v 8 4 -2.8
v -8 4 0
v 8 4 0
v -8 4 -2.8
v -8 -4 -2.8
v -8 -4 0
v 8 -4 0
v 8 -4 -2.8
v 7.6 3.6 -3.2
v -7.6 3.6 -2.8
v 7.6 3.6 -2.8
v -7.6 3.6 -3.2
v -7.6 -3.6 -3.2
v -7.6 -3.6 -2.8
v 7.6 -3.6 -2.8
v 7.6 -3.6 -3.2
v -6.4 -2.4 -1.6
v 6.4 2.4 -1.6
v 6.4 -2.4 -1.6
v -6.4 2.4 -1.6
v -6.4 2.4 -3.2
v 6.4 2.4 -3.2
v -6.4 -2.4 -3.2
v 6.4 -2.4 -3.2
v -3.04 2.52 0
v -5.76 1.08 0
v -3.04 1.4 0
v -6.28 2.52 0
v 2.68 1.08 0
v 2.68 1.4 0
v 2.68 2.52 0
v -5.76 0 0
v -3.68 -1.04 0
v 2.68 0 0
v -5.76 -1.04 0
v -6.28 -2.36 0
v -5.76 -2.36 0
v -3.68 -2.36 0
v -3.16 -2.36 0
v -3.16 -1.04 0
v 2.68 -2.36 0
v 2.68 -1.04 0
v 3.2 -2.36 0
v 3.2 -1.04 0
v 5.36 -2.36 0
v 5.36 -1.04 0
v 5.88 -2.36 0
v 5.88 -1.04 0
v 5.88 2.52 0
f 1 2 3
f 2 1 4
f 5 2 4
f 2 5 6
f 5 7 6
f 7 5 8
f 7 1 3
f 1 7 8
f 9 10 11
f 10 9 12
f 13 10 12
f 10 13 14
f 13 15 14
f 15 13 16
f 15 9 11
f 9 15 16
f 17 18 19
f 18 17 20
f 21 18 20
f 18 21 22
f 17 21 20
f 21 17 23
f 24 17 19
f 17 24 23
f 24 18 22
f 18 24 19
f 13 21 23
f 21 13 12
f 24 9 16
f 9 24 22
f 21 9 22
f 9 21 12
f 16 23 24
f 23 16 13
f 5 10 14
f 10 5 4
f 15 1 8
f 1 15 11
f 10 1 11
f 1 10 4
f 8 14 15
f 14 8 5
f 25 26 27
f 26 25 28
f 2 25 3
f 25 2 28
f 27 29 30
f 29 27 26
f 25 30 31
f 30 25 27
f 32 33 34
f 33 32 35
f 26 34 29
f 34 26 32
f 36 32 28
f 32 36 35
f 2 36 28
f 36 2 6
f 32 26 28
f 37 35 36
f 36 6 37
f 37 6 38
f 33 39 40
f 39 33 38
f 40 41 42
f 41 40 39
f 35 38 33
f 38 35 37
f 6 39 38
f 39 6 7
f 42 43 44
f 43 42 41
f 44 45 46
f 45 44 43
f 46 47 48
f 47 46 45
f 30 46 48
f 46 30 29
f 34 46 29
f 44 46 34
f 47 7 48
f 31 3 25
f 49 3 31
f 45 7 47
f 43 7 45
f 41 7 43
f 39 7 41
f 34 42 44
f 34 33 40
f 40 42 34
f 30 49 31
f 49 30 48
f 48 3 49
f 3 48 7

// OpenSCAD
// file: ../p/4-4edge.scad
use <../lib.scad>
$fa=1; $fs=0.2;
function ldraw_lib__4_4edge(realsolid=false) = [
// 0 Circle 1.0
// 0 Name: 4-4edge.dat
// 0 Author: James Jessiman
// 0 !LDRAW_ORG Primitive UPDATE 2017-01
// 0 !LICENSE Licensed under CC BY 2.0 and CC BY 4.0 : see CAreadme.txt
// 
// 0 BFC CERTIFY CCW
  [0,"BFC","CERTIFY"],
  [0,"BFC","CCW"],
// 
// 0 !HISTORY 1998-12-15 [PTadmin] Official Update 1998-10
// 0 !HISTORY 2005-12-28 [PTadmin] Official Update 2005-01
// 0 !HISTORY 2007-06-24 [PTadmin] Header formatted for Contributor Agreement
// 0 !HISTORY 2008-07-01 [PTadmin] Official Update 2008-01
// 0 !HISTORY 2017-01-15 [Steffen] BFCed
// 0 !HISTORY 2017-12-30 [PTadmin] Official Update 2017-01
// 
// 
// 2 24 1 0 0 0.9239 0 0.3827
  [2,24,1,0,0,0.9239,0,0.3827],
// 2 24 0.9239 0 0.3827 0.7071 0 0.7071
  [2,24,0.9239,0,0.3827,0.7071,0,0.7071],
// 2 24 0.7071 0 0.7071 0.3827 0 0.9239
  [2,24,0.7071,0,0.7071,0.3827,0,0.9239],
// 2 24 0.3827 0 0.9239 0 0 1
  [2,24,0.3827,0,0.9239,0,0,1],
// 2 24 0 0 1 -0.3827 0 0.9239
  [2,24,0,0,1,-0.3827,0,0.9239],
// 2 24 -0.3827 0 0.9239 -0.7071 0 0.7071
  [2,24,-0.3827,0,0.9239,-0.7071,0,0.7071],
// 2 24 -0.7071 0 0.7071 -0.9239 0 0.3827
  [2,24,-0.7071,0,0.7071,-0.9239,0,0.3827],
// 2 24 -0.9239 0 0.3827 -1 0 -0
  [2,24,-0.9239,0,0.3827,-1,0,-0],
// 2 24 -1 0 -0 -0.9239 0 -0.3827
  [2,24,-1,0,-0,-0.9239,0,-0.3827],
// 2 24 -0.9239 0 -0.3827 -0.7071 0 -0.7071
  [2,24,-0.9239,0,-0.3827,-0.7071,0,-0.7071],
// 2 24 -0.7071 0 -0.7071 -0.3827 0 -0.9239
  [2,24,-0.7071,0,-0.7071,-0.3827,0,-0.9239],
// 2 24 -0.3827 0 -0.9239 0 0 -1
  [2,24,-0.3827,0,-0.9239,0,0,-1],
// 2 24 0 0 -1 0.3827 0 -0.9239
  [2,24,0,0,-1,0.3827,0,-0.9239],
// 2 24 0.3827 0 -0.9239 0.7071 0 -0.7071
  [2,24,0.3827,0,-0.9239,0.7071,0,-0.7071],
// 2 24 0.7071 0 -0.7071 0.9239 0 -0.3827
  [2,24,0.7071,0,-0.7071,0.9239,0,-0.3827],
// 2 24 0.9239 0 -0.3827 1 0 0
  [2,24,0.9239,0,-0.3827,1,0,0],
];
module ldraw_lib__4_4edge(step=0, col=false, unit=2/5, alt=false, line=0.2, solid=!$preview)
    makepoly(ldraw_lib__4_4edge(solid), step=step, col=col, unit=unit, alt=alt, line=line, solid=solid);
ldraw_lib__4_4edge(line=0.2);
// file: ../p/4-4disc.scad
use <../lib.scad>
$fa=1; $fs=0.2;
function ldraw_lib__4_4disc(realsolid=false) = [
// 0 Disc 1.0
// 0 Name: 4-4disc.dat
// 0 Author: James Jessiman
// 0 !LDRAW_ORG Primitive UPDATE 2002-02
// 0 !LICENSE Licensed under CC BY 2.0 and CC BY 4.0 : see CAreadme.txt
// 
// 0 BFC CERTIFY CCW
  [0,"BFC","CERTIFY"],
  [0,"BFC","CCW"],
// 
// 0 !HISTORY 1998-12-15 [PTadmin] Official Update 1998-10
// 0 !HISTORY 2002-03-23 [sbliss] Added BFC statement
// 0 !HISTORY 2002-04-25 [PTadmin] Official Update 2002-02
// 0 !HISTORY 2007-06-24 [PTadmin] Header formatted for Contributor Agreement
// 0 !HISTORY 2008-07-01 [PTadmin] Official Update 2008-01
// 
// 
// 3 16 0 0 0 1 0 0 0.9239 0 0.3827
  [3,16,0,0,0,1,0,0,0.9239,0,0.3827],
// 3 16 0 0 0 0.9239 0 0.3827 0.7071 0 0.7071
  [3,16,0,0,0,0.9239,0,0.3827,0.7071,0,0.7071],
// 3 16 0 0 0 0.7071 0 0.7071 0.3827 0 0.9239
  [3,16,0,0,0,0.7071,0,0.7071,0.3827,0,0.9239],
// 3 16 0 0 0 0.3827 0 0.9239 0 0 1
  [3,16,0,0,0,0.3827,0,0.9239,0,0,1],
// 3 16 0 0 0 0 0 1 -0.3827 0 0.9239
  [3,16,0,0,0,0,0,1,-0.3827,0,0.9239],
// 3 16 0 0 0 -0.3827 0 0.9239 -0.7071 0 0.7071
  [3,16,0,0,0,-0.3827,0,0.9239,-0.7071,0,0.7071],
// 3 16 0 0 0 -0.7071 0 0.7071 -0.9239 0 0.3827
  [3,16,0,0,0,-0.7071,0,0.7071,-0.9239,0,0.3827],
// 3 16 0 0 0 -0.9239 0 0.3827 -1 0 -0
  [3,16,0,0,0,-0.9239,0,0.3827,-1,0,-0],
// 3 16 0 0 0 -1 0 -0 -0.9239 0 -0.3827
  [3,16,0,0,0,-1,0,-0,-0.9239,0,-0.3827],
// 3 16 0 0 0 -0.9239 0 -0.3827 -0.7071 0 -0.7071
  [3,16,0,0,0,-0.9239,0,-0.3827,-0.7071,0,-0.7071],
// 3 16 0 0 0 -0.7071 0 -0.7071 -0.3827 0 -0.9239
  [3,16,0,0,0,-0.7071,0,-0.7071,-0.3827,0,-0.9239],
// 3 16 0 0 0 -0.3827 0 -0.9239 0 0 -1
  [3,16,0,0,0,-0.3827,0,-0.9239,0,0,-1],
// 3 16 0 0 0 0 0 -1 0.3827 0 -0.9239
  [3,16,0,0,0,0,0,-1,0.3827,0,-0.9239],
// 3 16 0 0 0 0.3827 0 -0.9239 0.7071 0 -0.7071
  [3,16,0,0,0,0.3827,0,-0.9239,0.7071,0,-0.7071],
// 3 16 0 0 0 0.7071 0 -0.7071 0.9239 0 -0.3827
  [3,16,0,0,0,0.7071,0,-0.7071,0.9239,0,-0.3827],
// 3 16 0 0 0 0.9239 0 -0.3827 1 0 0
  [3,16,0,0,0,0.9239,0,-0.3827,1,0,0],
// 0
];
module ldraw_lib__4_4disc(step=0, col=false, unit=2/5, alt=false, line=0.2, solid=!$preview)
    makepoly(ldraw_lib__4_4disc(solid), step=step, col=col, unit=unit, alt=alt, line=line, solid=solid);
ldraw_lib__4_4disc(line=0.2);
// file: ../p/4-4cyli.scad
use <../lib.scad>
$fa=1; $fs=0.2;
function ldraw_lib__4_4cyli(realsolid=false) = [
// 0 Cylinder 1.0
// 0 Name: 4-4cyli.dat
// 0 Author: James Jessiman
// 0 !LDRAW_ORG Primitive UPDATE 2005-01
// 0 !LICENSE Licensed under CC BY 2.0 and CC BY 4.0 : see CAreadme.txt
// 
// 0 BFC CERTIFY CCW
  [0,"BFC","CERTIFY"],
  [0,"BFC","CCW"],
// 
// 0 !HISTORY 1998-12-15 [PTadmin] Official Update 1998-10
// 0 !HISTORY 2002-03-23 [sbliss] Added BFC statement; merged headers from files in distributions LDraw 0.27 and Complete.
// 0 !HISTORY 2002-04-25 [PTadmin] Official Update 2002-02
// 0 !HISTORY 2004-12-14 [guyvivan] BFC CCW
// 0 !HISTORY 2005-12-28 [PTadmin] Official Update 2005-01
// 0 !HISTORY 2007-06-24 [PTadmin] Header formatted for Contributor Agreement
// 0 !HISTORY 2008-07-01 [PTadmin] Official Update 2008-01
// 
// 
// 4 16 1 1 0 0.9239 1 0.3827 0.9239 0 0.3827 1 0 0
  [4,16,1,1,0,0.9239,1,0.3827,0.9239,0,0.3827,1,0,0],
// 5 24 1 0 0 1 1 0 0.9239 0 0.3827 0.9239 0 -0.3827
  [5,24,1,0,0,1,1,0,0.9239,0,0.3827,0.9239,0,-0.3827],
// 4 16 0.9239 1 0.3827 0.7071 1 0.7071 0.7071 0 0.7071 0.9239 0 0.3827
  [4,16,0.9239,1,0.3827,0.7071,1,0.7071,0.7071,0,0.7071,0.9239,0,0.3827],
// 5 24 0.9239 0 0.3827 0.9239 1 0.3827 0.7071 0 0.7071 1 0 0
  [5,24,0.9239,0,0.3827,0.9239,1,0.3827,0.7071,0,0.7071,1,0,0],
// 4 16 0.7071 1 0.7071 0.3827 1 0.9239 0.3827 0 0.9239 0.7071 0 0.7071
  [4,16,0.7071,1,0.7071,0.3827,1,0.9239,0.3827,0,0.9239,0.7071,0,0.7071],
// 5 24 0.7071 0 0.7071 0.7071 1 0.7071 0.3827 0 0.9239 0.9239 0 0.3827
  [5,24,0.7071,0,0.7071,0.7071,1,0.7071,0.3827,0,0.9239,0.9239,0,0.3827],
// 4 16 0.3827 1 0.9239 0 1 1 0 0 1 0.3827 0 0.9239
  [4,16,0.3827,1,0.9239,0,1,1,0,0,1,0.3827,0,0.9239],
// 5 24 0.3827 0 0.9239 0.3827 1 0.9239 0 0 1 0.7071 0 0.7071
  [5,24,0.3827,0,0.9239,0.3827,1,0.9239,0,0,1,0.7071,0,0.7071],
// 4 16 0 1 1 -0.3827 1 0.9239 -0.3827 0 0.9239 0 0 1
  [4,16,0,1,1,-0.3827,1,0.9239,-0.3827,0,0.9239,0,0,1],
// 5 24 0 0 1 0 1 1 -0.3827 0 0.9239 0.3827 0 0.9239
  [5,24,0,0,1,0,1,1,-0.3827,0,0.9239,0.3827,0,0.9239],
// 4 16 -0.3827 1 0.9239 -0.7071 1 0.7071 -0.7071 0 0.7071 -0.3827 0 0.9239
  [4,16,-0.3827,1,0.9239,-0.7071,1,0.7071,-0.7071,0,0.7071,-0.3827,0,0.9239],
// 5 24 -0.3827 0 0.9239 -0.3827 1 0.9239 -0.7071 0 0.7071 0 0 1
  [5,24,-0.3827,0,0.9239,-0.3827,1,0.9239,-0.7071,0,0.7071,0,0,1],
// 4 16 -0.7071 1 0.7071 -0.9239 1 0.3827 -0.9239 0 0.3827 -0.7071 0 0.7071
  [4,16,-0.7071,1,0.7071,-0.9239,1,0.3827,-0.9239,0,0.3827,-0.7071,0,0.7071],
// 5 24 -0.7071 0 0.7071 -0.7071 1 0.7071 -0.9239 0 0.3827 -0.3827 0 0.9239
  [5,24,-0.7071,0,0.7071,-0.7071,1,0.7071,-0.9239,0,0.3827,-0.3827,0,0.9239],
// 4 16 -0.9239 1 0.3827 -1 1 0 -1 0 0 -0.9239 0 0.3827
  [4,16,-0.9239,1,0.3827,-1,1,0,-1,0,0,-0.9239,0,0.3827],
// 5 24 -0.9239 0 0.3827 -0.9239 1 0.3827 -1 0 0 -0.7071 0 0.7071
  [5,24,-0.9239,0,0.3827,-0.9239,1,0.3827,-1,0,0,-0.7071,0,0.7071],
// 4 16 -1 1 0 -0.9239 1 -0.3827 -0.9239 0 -0.3827 -1 0 0
  [4,16,-1,1,0,-0.9239,1,-0.3827,-0.9239,0,-0.3827,-1,0,0],
// 5 24 -1 0 0 -1 1 0 -0.9239 0 -0.3827 -0.9239 0 0.3827
  [5,24,-1,0,0,-1,1,0,-0.9239,0,-0.3827,-0.9239,0,0.3827],
// 4 16 -0.9239 1 -0.3827 -0.7071 1 -0.7071 -0.7071 0 -0.7071 -0.9239 0 -0.3827
  [4,16,-0.9239,1,-0.3827,-0.7071,1,-0.7071,-0.7071,0,-0.7071,-0.9239,0,-0.3827],
// 5 24 -0.9239 0 -0.3827 -0.9239 1 -0.3827 -0.7071 0 -0.7071 -1 0 0
  [5,24,-0.9239,0,-0.3827,-0.9239,1,-0.3827,-0.7071,0,-0.7071,-1,0,0],
// 4 16 -0.7071 1 -0.7071 -0.3827 1 -0.9239 -0.3827 0 -0.9239 -0.7071 0 -0.7071
  [4,16,-0.7071,1,-0.7071,-0.3827,1,-0.9239,-0.3827,0,-0.9239,-0.7071,0,-0.7071],
// 5 24 -0.7071 0 -0.7071 -0.7071 1 -0.7071 -0.3827 0 -0.9239 -0.9239 0 -0.3827
  [5,24,-0.7071,0,-0.7071,-0.7071,1,-0.7071,-0.3827,0,-0.9239,-0.9239,0,-0.3827],
// 4 16 -0.3827 1 -0.9239 0 1 -1 0 0 -1 -0.3827 0 -0.9239
  [4,16,-0.3827,1,-0.9239,0,1,-1,0,0,-1,-0.3827,0,-0.9239],
// 5 24 -0.3827 0 -0.9239 -0.3827 1 -0.9239 0 0 -1 -0.7071 0 -0.7071
  [5,24,-0.3827,0,-0.9239,-0.3827,1,-0.9239,0,0,-1,-0.7071,0,-0.7071],
// 4 16 0 1 -1 0.3827 1 -0.9239 0.3827 0 -0.9239 0 0 -1
  [4,16,0,1,-1,0.3827,1,-0.9239,0.3827,0,-0.9239,0,0,-1],
// 5 24 0 0 -1 0 1 -1 0.3827 0 -0.9239 -0.3827 0 -0.9239
  [5,24,0,0,-1,0,1,-1,0.3827,0,-0.9239,-0.3827,0,-0.9239],
// 4 16 0.3827 1 -0.9239 0.7071 1 -0.7071 0.7071 0 -0.7071 0.3827 0 -0.9239
  [4,16,0.3827,1,-0.9239,0.7071,1,-0.7071,0.7071,0,-0.7071,0.3827,0,-0.9239],
// 5 24 0.3827 0 -0.9239 0.3827 1 -0.9239 0.7071 0 -0.7071 0 0 -1
  [5,24,0.3827,0,-0.9239,0.3827,1,-0.9239,0.7071,0,-0.7071,0,0,-1],
// 4 16 0.7071 1 -0.7071 0.9239 1 -0.3827 0.9239 0 -0.3827 0.7071 0 -0.7071
  [4,16,0.7071,1,-0.7071,0.9239,1,-0.3827,0.9239,0,-0.3827,0.7071,0,-0.7071],
// 5 24 0.7071 0 -0.7071 0.7071 1 -0.7071 0.9239 0 -0.3827 0.3827 0 -0.9239
  [5,24,0.7071,0,-0.7071,0.7071,1,-0.7071,0.9239,0,-0.3827,0.3827,0,-0.9239],
// 4 16 0.9239 1 -0.3827 1 1 0 1 0 0 0.9239 0 -0.3827
  [4,16,0.9239,1,-0.3827,1,1,0,1,0,0,0.9239,0,-0.3827],
// 5 24 0.9239 0 -0.3827 0.9239 1 -0.3827 1 0 0 0.7071 0 -0.7071
  [5,24,0.9239,0,-0.3827,0.9239,1,-0.3827,1,0,0,0.7071,0,-0.7071],
// 0
];
module ldraw_lib__4_4cyli(step=0, col=false, unit=2/5, alt=false, line=0.2, solid=!$preview)
    makepoly(ldraw_lib__4_4cyli(solid), step=step, col=col, unit=unit, alt=alt, line=line, solid=solid);
ldraw_lib__4_4cyli(line=0.2);
// file: ../p/stud3.scad
use <../lib.scad>
use <4-4cyli.scad>
use <4-4disc.scad>
use <4-4edge.scad>
$fa=1; $fs=0.2;
function ldraw_lib__stud3(realsolid=false) = realsolid ? 
    [openscad(translate([0,0,-eps()], o=cylinder(4+eps(), r=4)),2)] : [
// 0 Stud Tube Solid
// 0 Name: stud3.dat
// 0 Author: James Jessiman
// 0 !LDRAW_ORG Primitive UPDATE 2012-01
// 0 !LICENSE Licensed under CC BY 2.0 and CC BY 4.0 : see CAreadme.txt
// 
// 0 BFC CERTIFY CCW
  [0,"BFC","CERTIFY"],
  [0,"BFC","CCW"],
// 
// 0 !HISTORY 2002-04-04 [sbliss] Modified for BFC compliance
// 0 !HISTORY 2002-04-25 [PTadmin] Official Update 2002-02
// 0 !HISTORY 2007-06-24 [PTadmin] Header formatted for Contributor Agreement
// 0 !HISTORY 2008-07-01 [PTadmin] Official Update 2008-01
// 0 !HISTORY 2012-02-16 [Philo] Changed to CCW
// 0 !HISTORY 2012-03-30 [PTadmin] Official Update 2012-01
// 
// 
// 1 16 0 -4 0 4 0 0 0 1 0 0 0 4 4-4edge.dat
  [1,16,0,-4,0,4,0,0,0,1,0,0,0,4, ldraw_lib__4_4edge(realsolid)],
// 1 16 0 0 0 4 0 0 0 1 0 0 0 4 4-4edge.dat
  [1,16,0,0,0,4,0,0,0,1,0,0,0,4, ldraw_lib__4_4edge(realsolid)],
// 1 16 0 -4 0 4 0 0 0 1 0 0 0 4 4-4disc.dat
  [1,16,0,-4,0,4,0,0,0,1,0,0,0,4, ldraw_lib__4_4disc(realsolid)],
// 1 16 0 -4 0 4 0 0 0 4 0 0 0 4 4-4cyli.dat
  [1,16,0,-4,0,4,0,0,0,4,0,0,0,4, ldraw_lib__4_4cyli(realsolid)],
];
module ldraw_lib__stud3(step=0, col=false, unit=2/5, alt=false, line=0.2, solid=!$preview)
    makepoly(ldraw_lib__stud3(solid), step=step, col=col, unit=unit, alt=alt, line=line, solid=solid);
ldraw_lib__stud3(line=0.2);
// file: ../p/stud.scad
use <../lib.scad>
use <4-4cyli.scad>
use <4-4disc.scad>
use <4-4edge.scad>
$fa=1; $fs=0.2;
function ldraw_lib__stud(realsolid=false) = realsolid ? 
    [openscad(translate([0,0,-eps()], o=cylinder(4+eps(), r=6)),2)] : [
// 0 Stud
// 0 Name: stud.dat
// 0 Author: James Jessiman
// 0 !LDRAW_ORG Primitive UPDATE 2012-01
// 0 !LICENSE Licensed under CC BY 2.0 and CC BY 4.0 : see CAreadme.txt
// 
// 0 BFC CERTIFY CCW
  [0,"BFC","CERTIFY"],
  [0,"BFC","CCW"],
// 
// 0 !HISTORY 2002-04-04 [sbliss] Modified for BFC compliance
// 0 !HISTORY 2002-04-25 [PTadmin] Official Update 2002-02
// 0 !HISTORY 2007-06-24 [PTadmin] Header formatted for Contributor Agreement
// 0 !HISTORY 2008-07-01 [PTadmin] Official Update 2008-01
// 0 !HISTORY 2012-02-16 [Philo] Changed to CCW
// 0 !HISTORY 2012-03-30 [PTadmin] Official Update 2012-01
// 
// 
// 1 16 0 0 0 6 0 0 0 1 0 0 0 6 4-4edge.dat
  [1,16,0,0,0,6,0,0,0,1,0,0,0,6, ldraw_lib__4_4edge(realsolid)],
// 1 16 0 -4 0 6 0 0 0 1 0 0 0 6 4-4edge.dat
  [1,16,0,-4,0,6,0,0,0,1,0,0,0,6, ldraw_lib__4_4edge(realsolid)],
// 1 16 0 0 0 6 0 0 0 -4 0 0 0 6 4-4cyli.dat
  [1,16,0,0,0,6,0,0,0,-4,0,0,0,6, ldraw_lib__4_4cyli(realsolid)],
// 1 16 0 -4 0 6 0 0 0 1 0 0 0 6 4-4disc.dat
  [1,16,0,-4,0,6,0,0,0,1,0,0,0,6, ldraw_lib__4_4disc(realsolid)],
];
module ldraw_lib__stud(step=0, col=false, unit=2/5, alt=false, line=0.2, solid=!$preview)
    makepoly(ldraw_lib__stud(solid), step=step, col=col, unit=unit, alt=alt, line=line, solid=solid);
ldraw_lib__stud(line=0.2);
// file: ../p/box4t.scad
use <../lib.scad>
$fa=1; $fs=0.2;
function ldraw_lib__box4t(realsolid=false) = [
// 0 Box with 4 Adjacent Faces and All Edges
// 0 Name: box4t.dat
// 0 Author: Tore Eriksson [Tore_Eriksson]
// 0 !LDRAW_ORG Primitive UPDATE 2003-02
// 0 !LICENSE Licensed under CC BY 2.0 and CC BY 4.0 : see CAreadme.txt
// 
// 0 BFC CERTIFY CCW
  [0,"BFC","CERTIFY"],
  [0,"BFC","CCW"],
// 
// 0 !HISTORY 1997-09-29 [PTadmin] Official Update 1997-15
// 0 !HISTORY 2002-08-31 [izanette] Modified with WINDZ for BFC compliance
// 0 !HISTORY 2003-08-01 [PTadmin] Official Update 2003-02
// 0 !HISTORY 2007-06-24 [PTadmin] Header formatted for Contributor Agreement
// 0 !HISTORY 2008-07-01 [PTadmin] Official Update 2008-01
// 
// 
// 2 24 1 1 1 -1 1 1
  [2,24,1,1,1,-1,1,1],
// 2 24 -1 1 1 -1 1 -1
  [2,24,-1,1,1,-1,1,-1],
// 2 24 -1 1 -1 1 1 -1
  [2,24,-1,1,-1,1,1,-1],
// 2 24 1 1 -1 1 1 1
  [2,24,1,1,-1,1,1,1],
// 2 24 1 0 1 -1 0 1
  [2,24,1,0,1,-1,0,1],
// 2 24 -1 0 1 -1 0 -1
  [2,24,-1,0,1,-1,0,-1],
// 2 24 -1 0 -1 1 0 -1
  [2,24,-1,0,-1,1,0,-1],
// 2 24 1 0 -1 1 0 1
  [2,24,1,0,-1,1,0,1],
// 2 24 1 0 1 1 1 1
  [2,24,1,0,1,1,1,1],
// 2 24 -1 0 1 -1 1 1
  [2,24,-1,0,1,-1,1,1],
// 2 24 1 0 -1 1 1 -1
  [2,24,1,0,-1,1,1,-1],
// 2 24 -1 0 -1 -1 1 -1
  [2,24,-1,0,-1,-1,1,-1],
// 4 16 1 1 1 1 1 -1 -1 1 -1 -1 1 1
  [4,16,1,1,1,1,1,-1,-1,1,-1,-1,1,1],
// 4 16 1 1 1 -1 1 1 -1 0 1 1 0 1
  [4,16,1,1,1,-1,1,1,-1,0,1,1,0,1],
// 4 16 -1 1 1 -1 1 -1 -1 0 -1 -1 0 1
  [4,16,-1,1,1,-1,1,-1,-1,0,-1,-1,0,1],
// 0 4 16 -1 1 -1 -1 0 -1 1 0 -1 1 1 -1
// 4 16 1 1 -1 1 1 1 1 0 1 1 0 -1
  [4,16,1,1,-1,1,1,1,1,0,1,1,0,-1],
// 0
];
module ldraw_lib__box4t(step=0, col=false, unit=2/5, alt=false, line=0.2, solid=!$preview)
    makepoly(ldraw_lib__box4t(solid), step=step, col=col, unit=unit, alt=alt, line=line, solid=solid);
ldraw_lib__box4t(line=0.2);
// file: s/3004s01.scad
use <../../lib.scad>
use <../../p/box4t.scad>
use <../../p/box5.scad>
use <../../p/stud.scad>
use <../../p/stud3.scad>
$fa=1; $fs=0.2;
function ldraw_lib__s__3004s01(realsolid=false) = [
// 0 ~Brick  1 x  2 without Front Face
// 0 Name: s\3004s01.dat
// 0 Author: James Jessiman
// 0 !LDRAW_ORG Subpart UPDATE 2003-03
// 0 !LICENSE Licensed under CC BY 2.0 and CC BY 4.0 : see CAreadme.txt
// 
// 0 BFC CERTIFY CCW
  [0,"BFC","CERTIFY"],
  [0,"BFC","CCW"],
// 
// 0 !HISTORY 2003-09-07 [jriley] Subfiling, BFC
// 0 !HISTORY 2003-12-19 [PTadmin] Official Update 2003-03
// 0 !HISTORY 2007-08-29 [PTadmin] Header formatted for Contributor Agreement
// 0 !HISTORY 2008-07-01 [PTadmin] Official Update 2008-01
// 
// 
// 1 16 0 4 0 1 0 0 0 -5 0 0 0 1 stud3.dat
  [1,16,0,4,0,1,0,0,0,-5,0,0,0,1, ldraw_lib__stud3(realsolid)],
// 0 BFC INVERTNEXT
  [0,"BFC","INVERTNEXT"],
// 1 16 0 24 0 16 0 0 0 -20 0 0 0 6 box5.dat
  [1,16,0,24,0,16,0,0,0,-20,0,0,0,6, ldraw_lib__box5(realsolid)],
// 4 16 20 24 10 16 24 6 -16 24 6 -20 24 10
  [4,16,20,24,10,16,24,6,-16,24,6,-20,24,10],
// 4 16 -20 24 10 -16 24 6 -16 24 -6 -20 24 -10
  [4,16,-20,24,10,-16,24,6,-16,24,-6,-20,24,-10],
// 4 16 -20 24 -10 -16 24 -6 16 24 -6 20 24 -10
  [4,16,-20,24,-10,-16,24,-6,16,24,-6,20,24,-10],
// 4 16 20 24 -10 16 24 -6 16 24 6 20 24 10
  [4,16,20,24,-10,16,24,-6,16,24,6,20,24,10],
// 1 16 0 24 0 20 0 0 0 -24 0 0 0 10 box4t.dat
  [1,16,0,24,0,20,0,0,0,-24,0,0,0,10, ldraw_lib__box4t(realsolid)],
// 1 16 10 0 0 1 0 0 0 1 0 0 0 1 stud.dat
  [1,16,10,0,0,1,0,0,0,1,0,0,0,1, ldraw_lib__stud(realsolid)],
// 1 16 -10 0 0 1 0 0 0 1 0 0 0 1 stud.dat
  [1,16,-10,0,0,1,0,0,0,1,0,0,0,1, ldraw_lib__stud(realsolid)],
// 0
];
module ldraw_lib__s__3004s01(step=0, col=false, unit=2/5, alt=false, line=0.2, solid=!$preview)
    makepoly(ldraw_lib__s__3004s01(solid), step=step, col=col, unit=unit, alt=alt, line=line, solid=solid);
ldraw_lib__s__3004s01(line=0.2);
// file: ../p/box5.scad
use <../lib.scad>
$fa=1; $fs=0.2;
function ldraw_lib__box5(realsolid=false) = [
// 0 Box with 5 Faces and All Edges
// 0 Name: box5.dat
// 0 Author: James Jessiman
// 0 !LDRAW_ORG Primitive UPDATE 2012-01
// 0 !LICENSE Licensed under CC BY 2.0 and CC BY 4.0 : see CAreadme.txt
// 
// 0 BFC CERTIFY CCW
  [0,"BFC","CERTIFY"],
  [0,"BFC","CCW"],
// 
// 0 !HISTORY 2002-04-03 [sbliss] Modified for BFC compliance
// 0 !HISTORY 2002-04-25 [PTadmin] Official Update 2002-02
// 0 !HISTORY 2007-06-24 [PTadmin] Header formatted for Contributor Agreement
// 0 !HISTORY 2008-07-01 [PTadmin] Official Update 2008-01
// 0 !HISTORY 2012-02-16 [Philo] Changed to CCW
// 0 !HISTORY 2012-03-30 [PTadmin] Official Update 2012-01
// 
// 
// 2 24 1 1 1 -1 1 1
  [2,24,1,1,1,-1,1,1],
// 2 24 -1 1 1 -1 1 -1
  [2,24,-1,1,1,-1,1,-1],
// 2 24 -1 1 -1 1 1 -1
  [2,24,-1,1,-1,1,1,-1],
// 2 24 1 1 -1 1 1 1
  [2,24,1,1,-1,1,1,1],
// 2 24 1 0 1 -1 0 1
  [2,24,1,0,1,-1,0,1],
// 2 24 -1 0 1 -1 0 -1
  [2,24,-1,0,1,-1,0,-1],
// 2 24 -1 0 -1 1 0 -1
  [2,24,-1,0,-1,1,0,-1],
// 2 24 1 0 -1 1 0 1
  [2,24,1,0,-1,1,0,1],
// 2 24 1 0 1 1 1 1
  [2,24,1,0,1,1,1,1],
// 2 24 -1 0 1 -1 1 1
  [2,24,-1,0,1,-1,1,1],
// 2 24 1 0 -1 1 1 -1
  [2,24,1,0,-1,1,1,-1],
// 2 24 -1 0 -1 -1 1 -1
  [2,24,-1,0,-1,-1,1,-1],
// 4 16 -1 1 1 1 1 1 1 1 -1 -1 1 -1
  [4,16,-1,1,1,1,1,1,1,1,-1,-1,1,-1],
// 4 16 -1 1 1 -1 0 1 1 0 1 1 1 1
  [4,16,-1,1,1,-1,0,1,1,0,1,1,1,1],
// 4 16 -1 1 -1 -1 0 -1 -1 0 1 -1 1 1
  [4,16,-1,1,-1,-1,0,-1,-1,0,1,-1,1,1],
// 4 16 1 1 -1 1 0 -1 -1 0 -1 -1 1 -1
  [4,16,1,1,-1,1,0,-1,-1,0,-1,-1,1,-1],
// 4 16 1 1 1 1 0 1 1 0 -1 1 1 -1
  [4,16,1,1,1,1,0,1,1,0,-1,1,1,-1],
];
module ldraw_lib__box5(step=0, col=false, unit=2/5, alt=false, line=0.2, solid=!$preview)
    makepoly(ldraw_lib__box5(solid), step=step, col=col, unit=unit, alt=alt, line=line, solid=solid);
ldraw_lib__box5(line=0.2);
// file: ../p/box4.scad
use <../lib.scad>
$fa=1; $fs=0.2;
function ldraw_lib__box4(realsolid=false) = [
// 0 Box with 4 Faces (2 Parallel Pairs) and All Edges
// 0 Name: box4.dat
// 0 Author: James Jessiman
// 0 !LDRAW_ORG Primitive UPDATE 2012-01
// 0 !LICENSE Licensed under CC BY 2.0 and CC BY 4.0 : see CAreadme.txt
// 
// 0 BFC CERTIFY CCW
  [0,"BFC","CERTIFY"],
  [0,"BFC","CCW"],
// 
// 0 !HISTORY 2002-04-03 [sbliss] Modified for BFC compliance
// 0 !HISTORY 2002-04-25 [PTadmin] Official Update 2002-02
// 0 !HISTORY 2007-06-24 [PTadmin] Header formatted for Contributor Agreement
// 0 !HISTORY 2008-07-01 [PTadmin] Official Update 2008-01
// 0 !HISTORY 2012-02-16 [Philo] Changed to CCW
// 0 !HISTORY 2012-03-30 [PTadmin] Official Update 2012-01
// 
// 
// 2 24 1 1 1 -1 1 1
  [2,24,1,1,1,-1,1,1],
// 2 24 -1 1 1 -1 1 -1
  [2,24,-1,1,1,-1,1,-1],
// 2 24 -1 1 -1 1 1 -1
  [2,24,-1,1,-1,1,1,-1],
// 2 24 1 1 -1 1 1 1
  [2,24,1,1,-1,1,1,1],
// 2 24 1 0 1 -1 0 1
  [2,24,1,0,1,-1,0,1],
// 2 24 -1 0 1 -1 0 -1
  [2,24,-1,0,1,-1,0,-1],
// 2 24 -1 0 -1 1 0 -1
  [2,24,-1,0,-1,1,0,-1],
// 2 24 1 0 -1 1 0 1
  [2,24,1,0,-1,1,0,1],
// 2 24 1 0 1 1 1 1
  [2,24,1,0,1,1,1,1],
// 2 24 -1 0 1 -1 1 1
  [2,24,-1,0,1,-1,1,1],
// 2 24 1 0 -1 1 1 -1
  [2,24,1,0,-1,1,1,-1],
// 2 24 -1 0 -1 -1 1 -1
  [2,24,-1,0,-1,-1,1,-1],
// 4 16 -1 1 1 -1 0 1 1 0 1 1 1 1
  [4,16,-1,1,1,-1,0,1,1,0,1,1,1,1],
// 4 16 -1 1 -1 -1 0 -1 -1 0 1 -1 1 1
  [4,16,-1,1,-1,-1,0,-1,-1,0,1,-1,1,1],
// 4 16 1 1 -1 1 0 -1 -1 0 -1 -1 1 -1
  [4,16,1,1,-1,1,0,-1,-1,0,-1,-1,1,-1],
// 4 16 1 1 1 1 0 1 1 0 -1 1 1 -1
  [4,16,1,1,1,1,0,1,1,0,-1,1,1,-1],
];
module ldraw_lib__box4(step=0, col=false, unit=2/5, alt=false, line=0.2, solid=!$preview)
    makepoly(ldraw_lib__box4(solid), step=step, col=col, unit=unit, alt=alt, line=line, solid=solid);
ldraw_lib__box4(line=0.2);
// file: 3004.scad
use <../lib.scad>
use <s/3004s01.scad>
$fa=1; $fs=0.2;
function ldraw_lib__3004(realsolid=false) = [
// 0 Brick  1 x  2
// 0 Name: 3004.dat
// 0 Author: James Jessiman
// 0 !LDRAW_ORG Part UPDATE 2022-05
// 0 !LICENSE Licensed under CC BY 2.0 and CC BY 4.0 : see CAreadme.txt
// 
// 0 BFC CERTIFY CCW
  [0,"BFC","CERTIFY"],
  [0,"BFC","CCW"],
// 
// 0 !HISTORY 2001-10-26 [PTadmin] Official Update 2001-01
// 0 !HISTORY 2002-05-07 {unknown} BFC Certification
// 0 !HISTORY 2002-06-11 [PTadmin] Official Update 2002-03
// 0 !HISTORY 2007-05-07 [PTadmin] Header formatted for Contributor Agreement
// 0 !HISTORY 2008-07-01 [PTadmin] Official Update 2008-01
// 0 !HISTORY 2022-08-04 [MagFors] Using subfile
// 0 !HISTORY 2022-09-15 [PTadmin] Official Update 2022-05
// 
// 
// 1 16 0 0 0 1 0 0 0 1 0 0 0 1 s\3004s01.dat
  [1,16,0,0,0,1,0,0,0,1,0,0,0,1, ldraw_lib__s__3004s01(realsolid)],
// 4 16 -20 24 -10 20 24 -10 20 0 -10 -20 0 -10
  [4,16,-20,24,-10,20,24,-10,20,0,-10,-20,0,-10],
];
module ldraw_lib__3004(step=0, col=false, unit=2/5, alt=false, line=0.2, solid=!$preview)
    makepoly(ldraw_lib__3004(solid), step=step, col=col, unit=unit, alt=alt, line=line, solid=solid);
ldraw_lib__3004(line=0.2);
// file: s/3069bs01.scad
use <../../lib.scad>
use <../../p/box4.scad>
use <../../p/box5.scad>
$fa=1; $fs=0.2;
function ldraw_lib__s__3069bs01(realsolid=false) = [
// 0 ~Tile  1 x  2 with Groove without Top Face
// 0 Name: s\3069bs01.dat
// 0 Author: Santeri Piippo [arezey]
// 0 !LDRAW_ORG Subpart UPDATE 2010-02
// 0 !LICENSE Licensed under CC BY 2.0 and CC BY 4.0 : see CAreadme.txt
// 
// 0 BFC CERTIFY CCW
  [0,"BFC","CERTIFY"],
  [0,"BFC","CCW"],
// 
// 0 !HISTORY 2010-07-05 [PTadmin] Official Update 2010-02
// 
// 
// 1 16 0 0 0 20 0 0 0 7 0 0 0 10 box4.dat
  [1,16,0,0,0,20,0,0,0,7,0,0,0,10, ldraw_lib__box4(realsolid)],
// 1 16 0 7 0 19 0 0 0 1 0 0 0 9 box4.dat
  [1,16,0,7,0,19,0,0,0,1,0,0,0,9, ldraw_lib__box4(realsolid)],
// 0 BFC INVERTNEXT
  [0,"BFC","INVERTNEXT"],
// 1 16 0 8 0 16 0 0 0 -4 0 0 0 6 box5.dat
  [1,16,0,8,0,16,0,0,0,-4,0,0,0,6, ldraw_lib__box5(realsolid)],
// 4 16 -19 8 9 -16 8 6 -16 8 -6 -19 8 -9
  [4,16,-19,8,9,-16,8,6,-16,8,-6,-19,8,-9],
// 4 16 19 8 -9 16 8 -6 16 8 6 19 8 9
  [4,16,19,8,-9,16,8,-6,16,8,6,19,8,9],
// 4 16 19 8 9 16 8 6 -16 8 6 -19 8 9
  [4,16,19,8,9,16,8,6,-16,8,6,-19,8,9],
// 4 16 -19 8 -9 -16 8 -6 16 8 -6 19 8 -9
  [4,16,-19,8,-9,-16,8,-6,16,8,-6,19,8,-9],
// 4 16 -20 7 10 -19 7 9 -19 7 -9 -20 7 -10
  [4,16,-20,7,10,-19,7,9,-19,7,-9,-20,7,-10],
// 4 16 20 7 -10 19 7 -9 19 7 9 20 7 10
  [4,16,20,7,-10,19,7,-9,19,7,9,20,7,10],
// 4 16 20 7 10 19 7 9 -19 7 9 -20 7 10
  [4,16,20,7,10,19,7,9,-19,7,9,-20,7,10],
// 4 16 -20 7 -10 -19 7 -9 19 7 -9 20 7 -10
  [4,16,-20,7,-10,-19,7,-9,19,7,-9,20,7,-10],
// 0 //
];
module ldraw_lib__s__3069bs01(step=0, col=false, unit=2/5, alt=false, line=0.2, solid=!$preview)
    makepoly(ldraw_lib__s__3069bs01(solid), step=step, col=col, unit=unit, alt=alt, line=line, solid=solid);
ldraw_lib__s__3069bs01(line=0.2);
// main file
use <../lib.scad>
use <s/3069bs01.scad>
$fa=1; $fs=0.2;
function ldraw_lib__3069bp00(realsolid=false) = [
// 0 Tile  1 x  2 with Bed Pattern
// 0 Name: 3069bp00.dat
// 0 Author: Alex Taylor [anathema]
// 0 !LDRAW_ORG Part UPDATE 2009-03
// 0 !LICENSE Licensed under CC BY 2.0 and CC BY 4.0 : see CAreadme.txt
// 
// 0 BFC CERTIFY CCW
  [0,"BFC","CERTIFY"],
  [0,"BFC","CCW"],
// 
// 0 !HISTORY 2009-12-29 [PTadmin] Official Update 2009-03
// 
// 
// 1 16 0 0 0 1 0 0 0 1 0 0 0 1 s\3069bs01.dat
  [1,16,0,0,0,1,0,0,0,1,0,0,0,1, ldraw_lib__s__3069bs01(realsolid)],
// 4 0 -14.4 0 2.7 -7.6 0 3.5 -7.6 0 6.3 -15.7 0 6.3
  [4,0,-14.4,0,2.7,-7.6,0,3.5,-7.6,0,6.3,-15.7,0,6.3],
// 4 16 -15.7 0 6.3 -7.6 0 6.3 20 0 10 -20 0 10
  [4,16,-15.7,0,6.3,-7.6,0,6.3,20,0,10,-20,0,10],
// 4 0 6.7 0 2.7 6.7 0 3.5 -7.6 0 3.5 -14.4 0 2.7
  [4,0,6.7,0,2.7,6.7,0,3.5,-7.6,0,3.5,-14.4,0,2.7],
// 4 16 -7.6 0 6.3 -7.6 0 3.5 6.7 0 3.5 6.7 0 6.3
  [4,16,-7.6,0,6.3,-7.6,0,3.5,6.7,0,3.5,6.7,0,6.3],
// 4 0 -9.2 0 -2.6 6.7 0 0 -14.4 0 0 -14.4 0 -2.6
  [4,0,-9.2,0,-2.6,6.7,0,0,-14.4,0,0,-14.4,0,-2.6],
// 4 16 -14.4 0 2.7 -14.4 0 0 6.7 0 0 6.7 0 2.7
  [4,16,-14.4,0,2.7,-14.4,0,0,6.7,0,0,6.7,0,2.7],
// 4 0 -14.4 0 -2.6 -14.4 0 0 -15.7 0 6.3 -15.7 0 -5.9
  [4,0,-14.4,0,-2.6,-14.4,0,0,-15.7,0,6.3,-15.7,0,-5.9],
// 4 16 -15.7 0 -5.9 -15.7 0 6.3 -20 0 10 -20 0 -10
  [4,16,-15.7,0,-5.9,-15.7,0,6.3,-20,0,10,-20,0,-10],
// 3 0 -14.4 0 0 -14.4 0 2.7 -15.7 0 6.3
  [3,0,-14.4,0,0,-14.4,0,2.7,-15.7,0,6.3],
// 3 0 -14.4 0 -5.9 -14.4 0 -2.6 -15.7 0 -5.9
  [3,0,-14.4,0,-5.9,-14.4,0,-2.6,-15.7,0,-5.9],
// 3 16 -15.7 0 -5.9 -20 0 -10 -14.4 0 -5.9
  [3,16,-15.7,0,-5.9,-20,0,-10,-14.4,0,-5.9],
// 3 16 -14.4 0 -5.9 -20 0 -10 -9.2 0 -5.9
  [3,16,-14.4,0,-5.9,-20,0,-10,-9.2,0,-5.9],
// 4 0 -7.9 0 -2.6 -9.2 0 -2.6 -9.2 0 -5.9 -7.9 0 -5.9
  [4,0,-7.9,0,-2.6,-9.2,0,-2.6,-9.2,0,-5.9,-7.9,0,-5.9],
// 4 16 -7.9 0 -5.9 6.7 0 -5.9 6.7 0 -2.6 -7.9 0 -2.6
  [4,16,-7.9,0,-5.9,6.7,0,-5.9,6.7,0,-2.6,-7.9,0,-2.6],
// 4 16 -14.4 0 -5.9 -9.2 0 -5.9 -9.2 0 -2.6 -14.4 0 -2.6
  [4,16,-14.4,0,-5.9,-9.2,0,-5.9,-9.2,0,-2.6,-14.4,0,-2.6],
// 4 16 -7.9 0 -5.9 -9.2 0 -5.9 -20 0 -10 20 0 -10
  [4,16,-7.9,0,-5.9,-9.2,0,-5.9,-20,0,-10,20,0,-10],
// 4 0 8 0 -2.6 6.7 0 -2.6 6.7 0 -5.9 8 0 -5.9
  [4,0,8,0,-2.6,6.7,0,-2.6,6.7,0,-5.9,8,0,-5.9],
// 4 16 8 0 -5.9 13.4 0 -5.9 13.4 0 -2.6 8 0 -2.6
  [4,16,8,0,-5.9,13.4,0,-5.9,13.4,0,-2.6,8,0,-2.6],
// 4 0 14.7 0 -2.6 13.4 0 -2.6 13.4 0 -5.9 14.7 0 -5.9
  [4,0,14.7,0,-2.6,13.4,0,-2.6,13.4,0,-5.9,14.7,0,-5.9],
// 4 0 6.7 0 3.5 6.7 0 2.7 13.4 0 -2.6 14.7 0 -2.6
  [4,0,6.7,0,3.5,6.7,0,2.7,13.4,0,-2.6,14.7,0,-2.6],
// 3 0 6.7 0 0 13.4 0 -2.6 6.7 0 2.7
  [3,0,6.7,0,0,13.4,0,-2.6,6.7,0,2.7],
// 3 0 8 0 -2.6 13.4 0 -2.6 6.7 0 0
  [3,0,8,0,-2.6,13.4,0,-2.6,6.7,0,0],
// 3 16 14.7 0 -5.9 20 0 -10 14.7 0 -2.6
  [3,16,14.7,0,-5.9,20,0,-10,14.7,0,-2.6],
// 3 16 6.7 0 6.3 20 0 10 -7.6 0 6.3
  [3,16,6.7,0,6.3,20,0,10,-7.6,0,6.3],
// 3 16 14.7 0 6.3 20 0 10 6.7 0 6.3
  [3,16,14.7,0,6.3,20,0,10,6.7,0,6.3],
// 3 16 13.4 0 -5.9 20 0 -10 14.7 0 -5.9
  [3,16,13.4,0,-5.9,20,0,-10,14.7,0,-5.9],
// 3 16 8 0 -5.9 20 0 -10 13.4 0 -5.9
  [3,16,8,0,-5.9,20,0,-10,13.4,0,-5.9],
// 3 16 6.7 0 -5.9 20 0 -10 8 0 -5.9
  [3,16,6.7,0,-5.9,20,0,-10,8,0,-5.9],
// 3 16 -7.9 0 -5.9 20 0 -10 6.7 0 -5.9
  [3,16,-7.9,0,-5.9,20,0,-10,6.7,0,-5.9],
// 3 0 6.7 0 0 6.7 0 -2.6 8 0 -2.6
  [3,0,6.7,0,0,6.7,0,-2.6,8,0,-2.6],
// 3 0 6.7 0 0 -9.2 0 -2.6 -7.9 0 -2.6
  [3,0,6.7,0,0,-9.2,0,-2.6,-7.9,0,-2.6],
// 3 0 -7.9 0 -2.6 6.7 0 -2.6 6.7 0 0
  [3,0,-7.9,0,-2.6,6.7,0,-2.6,6.7,0,0],
// 4 0 14.7 0 6.3 6.7 0 6.3 6.7 0 3.5 14.7 0 -2.6
  [4,0,14.7,0,6.3,6.7,0,6.3,6.7,0,3.5,14.7,0,-2.6],
// 4 16 14.7 0 -2.6 20 0 -10 20 0 10 14.7 0 6.3
  [4,16,14.7,0,-2.6,20,0,-10,20,0,10,14.7,0,6.3],
// 0
];
module ldraw_lib__3069bp00(step=0, col=false, unit=2/5, alt=false, line=0.2, solid=!$preview)
    makepoly(ldraw_lib__3069bp00(solid), step=step, col=col, unit=unit, alt=alt, line=line, solid=solid);
ldraw_lib__3069bp00(line=0.2);
